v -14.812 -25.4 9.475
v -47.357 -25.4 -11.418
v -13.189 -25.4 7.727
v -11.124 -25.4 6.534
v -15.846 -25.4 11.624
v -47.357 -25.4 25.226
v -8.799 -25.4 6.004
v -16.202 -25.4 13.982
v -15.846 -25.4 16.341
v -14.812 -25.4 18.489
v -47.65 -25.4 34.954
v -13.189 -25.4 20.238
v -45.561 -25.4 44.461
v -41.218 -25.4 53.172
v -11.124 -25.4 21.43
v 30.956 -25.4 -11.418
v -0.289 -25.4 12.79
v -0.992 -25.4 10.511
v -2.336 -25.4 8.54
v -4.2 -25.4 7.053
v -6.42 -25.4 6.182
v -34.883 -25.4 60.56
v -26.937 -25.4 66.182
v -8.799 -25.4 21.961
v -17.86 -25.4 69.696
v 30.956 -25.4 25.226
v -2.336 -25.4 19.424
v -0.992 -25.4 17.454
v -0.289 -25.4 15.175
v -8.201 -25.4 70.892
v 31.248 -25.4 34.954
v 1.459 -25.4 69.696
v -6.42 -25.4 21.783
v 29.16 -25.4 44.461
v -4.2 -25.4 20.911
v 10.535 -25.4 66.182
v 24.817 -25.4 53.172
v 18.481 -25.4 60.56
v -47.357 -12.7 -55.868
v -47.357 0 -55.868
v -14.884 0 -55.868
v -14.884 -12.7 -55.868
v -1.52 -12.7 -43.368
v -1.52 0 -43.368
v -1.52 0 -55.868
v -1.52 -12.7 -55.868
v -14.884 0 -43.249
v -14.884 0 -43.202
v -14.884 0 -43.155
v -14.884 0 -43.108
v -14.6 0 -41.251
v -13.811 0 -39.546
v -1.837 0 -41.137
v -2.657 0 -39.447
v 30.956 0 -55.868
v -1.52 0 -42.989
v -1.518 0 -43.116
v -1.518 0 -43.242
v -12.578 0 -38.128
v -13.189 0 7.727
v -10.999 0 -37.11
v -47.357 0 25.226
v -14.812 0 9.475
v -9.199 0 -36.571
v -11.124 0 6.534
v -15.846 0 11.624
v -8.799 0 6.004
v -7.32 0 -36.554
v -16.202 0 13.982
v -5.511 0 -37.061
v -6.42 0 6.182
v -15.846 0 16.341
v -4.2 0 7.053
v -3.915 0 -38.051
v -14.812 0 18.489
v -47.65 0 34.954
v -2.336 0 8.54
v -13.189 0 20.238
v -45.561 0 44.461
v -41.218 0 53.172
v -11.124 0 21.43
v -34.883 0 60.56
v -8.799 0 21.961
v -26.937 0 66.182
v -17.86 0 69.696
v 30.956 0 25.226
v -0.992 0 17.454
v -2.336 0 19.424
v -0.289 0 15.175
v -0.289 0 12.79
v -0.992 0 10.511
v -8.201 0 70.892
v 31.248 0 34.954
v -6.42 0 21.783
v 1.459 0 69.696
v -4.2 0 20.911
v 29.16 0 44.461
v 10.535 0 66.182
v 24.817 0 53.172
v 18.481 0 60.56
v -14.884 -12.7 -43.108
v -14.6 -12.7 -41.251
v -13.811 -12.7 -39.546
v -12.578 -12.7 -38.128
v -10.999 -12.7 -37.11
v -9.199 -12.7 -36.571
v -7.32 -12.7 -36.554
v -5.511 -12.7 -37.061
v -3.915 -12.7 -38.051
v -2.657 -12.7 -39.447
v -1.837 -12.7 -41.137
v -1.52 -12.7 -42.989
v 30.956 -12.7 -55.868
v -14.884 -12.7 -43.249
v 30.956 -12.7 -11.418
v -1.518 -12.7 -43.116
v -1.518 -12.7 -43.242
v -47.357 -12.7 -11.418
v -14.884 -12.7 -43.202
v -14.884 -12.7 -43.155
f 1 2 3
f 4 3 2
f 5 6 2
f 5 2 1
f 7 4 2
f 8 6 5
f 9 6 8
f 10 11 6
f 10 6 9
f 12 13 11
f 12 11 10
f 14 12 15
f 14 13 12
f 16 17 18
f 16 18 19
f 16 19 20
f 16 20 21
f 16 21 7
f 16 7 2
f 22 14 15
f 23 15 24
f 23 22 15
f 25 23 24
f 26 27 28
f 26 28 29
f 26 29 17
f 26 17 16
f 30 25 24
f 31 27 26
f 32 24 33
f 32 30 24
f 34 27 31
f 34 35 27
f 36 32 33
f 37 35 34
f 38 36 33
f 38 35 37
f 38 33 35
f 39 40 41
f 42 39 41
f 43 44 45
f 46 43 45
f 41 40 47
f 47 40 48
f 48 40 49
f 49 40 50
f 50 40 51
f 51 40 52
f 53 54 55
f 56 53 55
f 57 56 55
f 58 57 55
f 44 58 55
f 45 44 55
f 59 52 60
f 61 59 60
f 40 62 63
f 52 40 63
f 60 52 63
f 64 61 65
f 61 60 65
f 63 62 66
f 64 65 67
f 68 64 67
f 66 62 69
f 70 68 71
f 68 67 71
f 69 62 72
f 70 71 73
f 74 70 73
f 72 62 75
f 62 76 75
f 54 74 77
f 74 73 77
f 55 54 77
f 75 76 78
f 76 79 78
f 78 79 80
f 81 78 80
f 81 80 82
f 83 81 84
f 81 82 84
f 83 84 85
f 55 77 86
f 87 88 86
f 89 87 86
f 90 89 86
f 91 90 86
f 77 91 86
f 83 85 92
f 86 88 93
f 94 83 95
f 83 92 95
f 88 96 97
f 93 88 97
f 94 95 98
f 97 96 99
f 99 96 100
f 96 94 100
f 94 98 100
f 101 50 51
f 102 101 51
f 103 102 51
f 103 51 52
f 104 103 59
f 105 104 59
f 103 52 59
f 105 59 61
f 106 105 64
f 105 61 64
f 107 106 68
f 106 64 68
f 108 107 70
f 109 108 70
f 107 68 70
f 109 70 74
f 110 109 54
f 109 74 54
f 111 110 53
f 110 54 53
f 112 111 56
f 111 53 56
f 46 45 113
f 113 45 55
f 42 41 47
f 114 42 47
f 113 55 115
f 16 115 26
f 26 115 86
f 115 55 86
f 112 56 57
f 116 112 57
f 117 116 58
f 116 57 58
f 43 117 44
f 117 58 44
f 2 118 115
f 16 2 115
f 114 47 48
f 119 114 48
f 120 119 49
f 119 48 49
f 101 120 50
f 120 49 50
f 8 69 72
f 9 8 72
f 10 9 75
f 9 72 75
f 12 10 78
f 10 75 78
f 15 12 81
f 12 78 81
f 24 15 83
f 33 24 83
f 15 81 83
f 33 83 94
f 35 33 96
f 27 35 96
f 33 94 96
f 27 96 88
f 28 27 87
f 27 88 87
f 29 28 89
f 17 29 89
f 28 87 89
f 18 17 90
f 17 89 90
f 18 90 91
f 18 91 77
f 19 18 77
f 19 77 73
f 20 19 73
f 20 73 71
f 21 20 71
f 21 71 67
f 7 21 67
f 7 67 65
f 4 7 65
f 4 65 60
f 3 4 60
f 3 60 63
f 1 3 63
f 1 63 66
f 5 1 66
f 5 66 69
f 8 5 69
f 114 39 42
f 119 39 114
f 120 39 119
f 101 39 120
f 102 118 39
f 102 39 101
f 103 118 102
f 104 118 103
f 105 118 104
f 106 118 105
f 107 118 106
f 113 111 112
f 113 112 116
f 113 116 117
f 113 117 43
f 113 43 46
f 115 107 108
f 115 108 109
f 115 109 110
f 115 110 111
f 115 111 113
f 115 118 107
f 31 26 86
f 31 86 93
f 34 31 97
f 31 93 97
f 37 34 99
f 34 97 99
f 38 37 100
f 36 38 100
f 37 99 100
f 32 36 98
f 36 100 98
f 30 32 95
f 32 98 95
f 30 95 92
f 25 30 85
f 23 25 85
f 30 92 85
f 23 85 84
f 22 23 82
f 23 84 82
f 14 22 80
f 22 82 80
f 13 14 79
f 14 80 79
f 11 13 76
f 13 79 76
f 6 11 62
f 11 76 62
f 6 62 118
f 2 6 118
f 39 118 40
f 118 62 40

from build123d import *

# Parameters (mm, degrees)
F1_DEPTH = 12.7
F3_DEPTH = 12.7
F5_D     = 16.002


with BuildPart() as f1:
    # F0 (on Front) → F1 (new body)
    with BuildSketch(Plane.XZ):
        with BuildLine():
            Line((-47.357348, 25.225591), (-47.357348, -19.035261))
            Line((-47.357348, -19.035261), (-47.357348, -55.867718))
            Line((-47.357348, -55.867718), (-14.88383, -55.867718))
            Line((-14.88383, -55.867718), (-14.88383, -43.249417))
            ThreePointArc((-14.88383, -43.249417), (-14.884202, -43.178936), (-14.88383, -43.108455))
            ThreePointArc((-14.88383, -43.108455), (-8.260409, -36.49587), (-1.520228, -42.989401))
            ThreePointArc((-1.520228, -42.989401), (-1.51754, -43.178936), (-1.520228, -43.368471))
            Line((-1.520228, -43.368471), (-1.520228, -55.867718))
            Line((-1.520228, -55.867718), (30.955606, -55.867718))
            Line((30.955606, -55.867718), (30.955606, 25.225591))
            ThreePointArc((30.955606, 25.225591), (-8.200871, 70.891809), (-47.357348, 25.225591))
        make_face()
    extrude(amount=F1_DEPTH)

    # F2 (on face) → F3 (join)
    with BuildSketch(Plane.XZ.offset(12.7)):
        with BuildLine():
            Line((-47.357348, 25.225591), (-47.357348, -11.417718))
            Line((-47.357348, -11.417718), (30.955606, -11.417718))
            Line((30.955606, -11.417718), (30.955606, 25.225591))
            ThreePointArc((30.955606, 25.225591), (-8.200871, 70.891809), (-47.357348, 25.225591))
        make_face()
    extrude(amount=F3_DEPTH)

    # F5 (through all)
    with Locations(Plane.XZ.offset(25.4)):
        with Locations((-8.200871, 13.982282)):
            Hole(F5_D / 2)


solid = f1.part
